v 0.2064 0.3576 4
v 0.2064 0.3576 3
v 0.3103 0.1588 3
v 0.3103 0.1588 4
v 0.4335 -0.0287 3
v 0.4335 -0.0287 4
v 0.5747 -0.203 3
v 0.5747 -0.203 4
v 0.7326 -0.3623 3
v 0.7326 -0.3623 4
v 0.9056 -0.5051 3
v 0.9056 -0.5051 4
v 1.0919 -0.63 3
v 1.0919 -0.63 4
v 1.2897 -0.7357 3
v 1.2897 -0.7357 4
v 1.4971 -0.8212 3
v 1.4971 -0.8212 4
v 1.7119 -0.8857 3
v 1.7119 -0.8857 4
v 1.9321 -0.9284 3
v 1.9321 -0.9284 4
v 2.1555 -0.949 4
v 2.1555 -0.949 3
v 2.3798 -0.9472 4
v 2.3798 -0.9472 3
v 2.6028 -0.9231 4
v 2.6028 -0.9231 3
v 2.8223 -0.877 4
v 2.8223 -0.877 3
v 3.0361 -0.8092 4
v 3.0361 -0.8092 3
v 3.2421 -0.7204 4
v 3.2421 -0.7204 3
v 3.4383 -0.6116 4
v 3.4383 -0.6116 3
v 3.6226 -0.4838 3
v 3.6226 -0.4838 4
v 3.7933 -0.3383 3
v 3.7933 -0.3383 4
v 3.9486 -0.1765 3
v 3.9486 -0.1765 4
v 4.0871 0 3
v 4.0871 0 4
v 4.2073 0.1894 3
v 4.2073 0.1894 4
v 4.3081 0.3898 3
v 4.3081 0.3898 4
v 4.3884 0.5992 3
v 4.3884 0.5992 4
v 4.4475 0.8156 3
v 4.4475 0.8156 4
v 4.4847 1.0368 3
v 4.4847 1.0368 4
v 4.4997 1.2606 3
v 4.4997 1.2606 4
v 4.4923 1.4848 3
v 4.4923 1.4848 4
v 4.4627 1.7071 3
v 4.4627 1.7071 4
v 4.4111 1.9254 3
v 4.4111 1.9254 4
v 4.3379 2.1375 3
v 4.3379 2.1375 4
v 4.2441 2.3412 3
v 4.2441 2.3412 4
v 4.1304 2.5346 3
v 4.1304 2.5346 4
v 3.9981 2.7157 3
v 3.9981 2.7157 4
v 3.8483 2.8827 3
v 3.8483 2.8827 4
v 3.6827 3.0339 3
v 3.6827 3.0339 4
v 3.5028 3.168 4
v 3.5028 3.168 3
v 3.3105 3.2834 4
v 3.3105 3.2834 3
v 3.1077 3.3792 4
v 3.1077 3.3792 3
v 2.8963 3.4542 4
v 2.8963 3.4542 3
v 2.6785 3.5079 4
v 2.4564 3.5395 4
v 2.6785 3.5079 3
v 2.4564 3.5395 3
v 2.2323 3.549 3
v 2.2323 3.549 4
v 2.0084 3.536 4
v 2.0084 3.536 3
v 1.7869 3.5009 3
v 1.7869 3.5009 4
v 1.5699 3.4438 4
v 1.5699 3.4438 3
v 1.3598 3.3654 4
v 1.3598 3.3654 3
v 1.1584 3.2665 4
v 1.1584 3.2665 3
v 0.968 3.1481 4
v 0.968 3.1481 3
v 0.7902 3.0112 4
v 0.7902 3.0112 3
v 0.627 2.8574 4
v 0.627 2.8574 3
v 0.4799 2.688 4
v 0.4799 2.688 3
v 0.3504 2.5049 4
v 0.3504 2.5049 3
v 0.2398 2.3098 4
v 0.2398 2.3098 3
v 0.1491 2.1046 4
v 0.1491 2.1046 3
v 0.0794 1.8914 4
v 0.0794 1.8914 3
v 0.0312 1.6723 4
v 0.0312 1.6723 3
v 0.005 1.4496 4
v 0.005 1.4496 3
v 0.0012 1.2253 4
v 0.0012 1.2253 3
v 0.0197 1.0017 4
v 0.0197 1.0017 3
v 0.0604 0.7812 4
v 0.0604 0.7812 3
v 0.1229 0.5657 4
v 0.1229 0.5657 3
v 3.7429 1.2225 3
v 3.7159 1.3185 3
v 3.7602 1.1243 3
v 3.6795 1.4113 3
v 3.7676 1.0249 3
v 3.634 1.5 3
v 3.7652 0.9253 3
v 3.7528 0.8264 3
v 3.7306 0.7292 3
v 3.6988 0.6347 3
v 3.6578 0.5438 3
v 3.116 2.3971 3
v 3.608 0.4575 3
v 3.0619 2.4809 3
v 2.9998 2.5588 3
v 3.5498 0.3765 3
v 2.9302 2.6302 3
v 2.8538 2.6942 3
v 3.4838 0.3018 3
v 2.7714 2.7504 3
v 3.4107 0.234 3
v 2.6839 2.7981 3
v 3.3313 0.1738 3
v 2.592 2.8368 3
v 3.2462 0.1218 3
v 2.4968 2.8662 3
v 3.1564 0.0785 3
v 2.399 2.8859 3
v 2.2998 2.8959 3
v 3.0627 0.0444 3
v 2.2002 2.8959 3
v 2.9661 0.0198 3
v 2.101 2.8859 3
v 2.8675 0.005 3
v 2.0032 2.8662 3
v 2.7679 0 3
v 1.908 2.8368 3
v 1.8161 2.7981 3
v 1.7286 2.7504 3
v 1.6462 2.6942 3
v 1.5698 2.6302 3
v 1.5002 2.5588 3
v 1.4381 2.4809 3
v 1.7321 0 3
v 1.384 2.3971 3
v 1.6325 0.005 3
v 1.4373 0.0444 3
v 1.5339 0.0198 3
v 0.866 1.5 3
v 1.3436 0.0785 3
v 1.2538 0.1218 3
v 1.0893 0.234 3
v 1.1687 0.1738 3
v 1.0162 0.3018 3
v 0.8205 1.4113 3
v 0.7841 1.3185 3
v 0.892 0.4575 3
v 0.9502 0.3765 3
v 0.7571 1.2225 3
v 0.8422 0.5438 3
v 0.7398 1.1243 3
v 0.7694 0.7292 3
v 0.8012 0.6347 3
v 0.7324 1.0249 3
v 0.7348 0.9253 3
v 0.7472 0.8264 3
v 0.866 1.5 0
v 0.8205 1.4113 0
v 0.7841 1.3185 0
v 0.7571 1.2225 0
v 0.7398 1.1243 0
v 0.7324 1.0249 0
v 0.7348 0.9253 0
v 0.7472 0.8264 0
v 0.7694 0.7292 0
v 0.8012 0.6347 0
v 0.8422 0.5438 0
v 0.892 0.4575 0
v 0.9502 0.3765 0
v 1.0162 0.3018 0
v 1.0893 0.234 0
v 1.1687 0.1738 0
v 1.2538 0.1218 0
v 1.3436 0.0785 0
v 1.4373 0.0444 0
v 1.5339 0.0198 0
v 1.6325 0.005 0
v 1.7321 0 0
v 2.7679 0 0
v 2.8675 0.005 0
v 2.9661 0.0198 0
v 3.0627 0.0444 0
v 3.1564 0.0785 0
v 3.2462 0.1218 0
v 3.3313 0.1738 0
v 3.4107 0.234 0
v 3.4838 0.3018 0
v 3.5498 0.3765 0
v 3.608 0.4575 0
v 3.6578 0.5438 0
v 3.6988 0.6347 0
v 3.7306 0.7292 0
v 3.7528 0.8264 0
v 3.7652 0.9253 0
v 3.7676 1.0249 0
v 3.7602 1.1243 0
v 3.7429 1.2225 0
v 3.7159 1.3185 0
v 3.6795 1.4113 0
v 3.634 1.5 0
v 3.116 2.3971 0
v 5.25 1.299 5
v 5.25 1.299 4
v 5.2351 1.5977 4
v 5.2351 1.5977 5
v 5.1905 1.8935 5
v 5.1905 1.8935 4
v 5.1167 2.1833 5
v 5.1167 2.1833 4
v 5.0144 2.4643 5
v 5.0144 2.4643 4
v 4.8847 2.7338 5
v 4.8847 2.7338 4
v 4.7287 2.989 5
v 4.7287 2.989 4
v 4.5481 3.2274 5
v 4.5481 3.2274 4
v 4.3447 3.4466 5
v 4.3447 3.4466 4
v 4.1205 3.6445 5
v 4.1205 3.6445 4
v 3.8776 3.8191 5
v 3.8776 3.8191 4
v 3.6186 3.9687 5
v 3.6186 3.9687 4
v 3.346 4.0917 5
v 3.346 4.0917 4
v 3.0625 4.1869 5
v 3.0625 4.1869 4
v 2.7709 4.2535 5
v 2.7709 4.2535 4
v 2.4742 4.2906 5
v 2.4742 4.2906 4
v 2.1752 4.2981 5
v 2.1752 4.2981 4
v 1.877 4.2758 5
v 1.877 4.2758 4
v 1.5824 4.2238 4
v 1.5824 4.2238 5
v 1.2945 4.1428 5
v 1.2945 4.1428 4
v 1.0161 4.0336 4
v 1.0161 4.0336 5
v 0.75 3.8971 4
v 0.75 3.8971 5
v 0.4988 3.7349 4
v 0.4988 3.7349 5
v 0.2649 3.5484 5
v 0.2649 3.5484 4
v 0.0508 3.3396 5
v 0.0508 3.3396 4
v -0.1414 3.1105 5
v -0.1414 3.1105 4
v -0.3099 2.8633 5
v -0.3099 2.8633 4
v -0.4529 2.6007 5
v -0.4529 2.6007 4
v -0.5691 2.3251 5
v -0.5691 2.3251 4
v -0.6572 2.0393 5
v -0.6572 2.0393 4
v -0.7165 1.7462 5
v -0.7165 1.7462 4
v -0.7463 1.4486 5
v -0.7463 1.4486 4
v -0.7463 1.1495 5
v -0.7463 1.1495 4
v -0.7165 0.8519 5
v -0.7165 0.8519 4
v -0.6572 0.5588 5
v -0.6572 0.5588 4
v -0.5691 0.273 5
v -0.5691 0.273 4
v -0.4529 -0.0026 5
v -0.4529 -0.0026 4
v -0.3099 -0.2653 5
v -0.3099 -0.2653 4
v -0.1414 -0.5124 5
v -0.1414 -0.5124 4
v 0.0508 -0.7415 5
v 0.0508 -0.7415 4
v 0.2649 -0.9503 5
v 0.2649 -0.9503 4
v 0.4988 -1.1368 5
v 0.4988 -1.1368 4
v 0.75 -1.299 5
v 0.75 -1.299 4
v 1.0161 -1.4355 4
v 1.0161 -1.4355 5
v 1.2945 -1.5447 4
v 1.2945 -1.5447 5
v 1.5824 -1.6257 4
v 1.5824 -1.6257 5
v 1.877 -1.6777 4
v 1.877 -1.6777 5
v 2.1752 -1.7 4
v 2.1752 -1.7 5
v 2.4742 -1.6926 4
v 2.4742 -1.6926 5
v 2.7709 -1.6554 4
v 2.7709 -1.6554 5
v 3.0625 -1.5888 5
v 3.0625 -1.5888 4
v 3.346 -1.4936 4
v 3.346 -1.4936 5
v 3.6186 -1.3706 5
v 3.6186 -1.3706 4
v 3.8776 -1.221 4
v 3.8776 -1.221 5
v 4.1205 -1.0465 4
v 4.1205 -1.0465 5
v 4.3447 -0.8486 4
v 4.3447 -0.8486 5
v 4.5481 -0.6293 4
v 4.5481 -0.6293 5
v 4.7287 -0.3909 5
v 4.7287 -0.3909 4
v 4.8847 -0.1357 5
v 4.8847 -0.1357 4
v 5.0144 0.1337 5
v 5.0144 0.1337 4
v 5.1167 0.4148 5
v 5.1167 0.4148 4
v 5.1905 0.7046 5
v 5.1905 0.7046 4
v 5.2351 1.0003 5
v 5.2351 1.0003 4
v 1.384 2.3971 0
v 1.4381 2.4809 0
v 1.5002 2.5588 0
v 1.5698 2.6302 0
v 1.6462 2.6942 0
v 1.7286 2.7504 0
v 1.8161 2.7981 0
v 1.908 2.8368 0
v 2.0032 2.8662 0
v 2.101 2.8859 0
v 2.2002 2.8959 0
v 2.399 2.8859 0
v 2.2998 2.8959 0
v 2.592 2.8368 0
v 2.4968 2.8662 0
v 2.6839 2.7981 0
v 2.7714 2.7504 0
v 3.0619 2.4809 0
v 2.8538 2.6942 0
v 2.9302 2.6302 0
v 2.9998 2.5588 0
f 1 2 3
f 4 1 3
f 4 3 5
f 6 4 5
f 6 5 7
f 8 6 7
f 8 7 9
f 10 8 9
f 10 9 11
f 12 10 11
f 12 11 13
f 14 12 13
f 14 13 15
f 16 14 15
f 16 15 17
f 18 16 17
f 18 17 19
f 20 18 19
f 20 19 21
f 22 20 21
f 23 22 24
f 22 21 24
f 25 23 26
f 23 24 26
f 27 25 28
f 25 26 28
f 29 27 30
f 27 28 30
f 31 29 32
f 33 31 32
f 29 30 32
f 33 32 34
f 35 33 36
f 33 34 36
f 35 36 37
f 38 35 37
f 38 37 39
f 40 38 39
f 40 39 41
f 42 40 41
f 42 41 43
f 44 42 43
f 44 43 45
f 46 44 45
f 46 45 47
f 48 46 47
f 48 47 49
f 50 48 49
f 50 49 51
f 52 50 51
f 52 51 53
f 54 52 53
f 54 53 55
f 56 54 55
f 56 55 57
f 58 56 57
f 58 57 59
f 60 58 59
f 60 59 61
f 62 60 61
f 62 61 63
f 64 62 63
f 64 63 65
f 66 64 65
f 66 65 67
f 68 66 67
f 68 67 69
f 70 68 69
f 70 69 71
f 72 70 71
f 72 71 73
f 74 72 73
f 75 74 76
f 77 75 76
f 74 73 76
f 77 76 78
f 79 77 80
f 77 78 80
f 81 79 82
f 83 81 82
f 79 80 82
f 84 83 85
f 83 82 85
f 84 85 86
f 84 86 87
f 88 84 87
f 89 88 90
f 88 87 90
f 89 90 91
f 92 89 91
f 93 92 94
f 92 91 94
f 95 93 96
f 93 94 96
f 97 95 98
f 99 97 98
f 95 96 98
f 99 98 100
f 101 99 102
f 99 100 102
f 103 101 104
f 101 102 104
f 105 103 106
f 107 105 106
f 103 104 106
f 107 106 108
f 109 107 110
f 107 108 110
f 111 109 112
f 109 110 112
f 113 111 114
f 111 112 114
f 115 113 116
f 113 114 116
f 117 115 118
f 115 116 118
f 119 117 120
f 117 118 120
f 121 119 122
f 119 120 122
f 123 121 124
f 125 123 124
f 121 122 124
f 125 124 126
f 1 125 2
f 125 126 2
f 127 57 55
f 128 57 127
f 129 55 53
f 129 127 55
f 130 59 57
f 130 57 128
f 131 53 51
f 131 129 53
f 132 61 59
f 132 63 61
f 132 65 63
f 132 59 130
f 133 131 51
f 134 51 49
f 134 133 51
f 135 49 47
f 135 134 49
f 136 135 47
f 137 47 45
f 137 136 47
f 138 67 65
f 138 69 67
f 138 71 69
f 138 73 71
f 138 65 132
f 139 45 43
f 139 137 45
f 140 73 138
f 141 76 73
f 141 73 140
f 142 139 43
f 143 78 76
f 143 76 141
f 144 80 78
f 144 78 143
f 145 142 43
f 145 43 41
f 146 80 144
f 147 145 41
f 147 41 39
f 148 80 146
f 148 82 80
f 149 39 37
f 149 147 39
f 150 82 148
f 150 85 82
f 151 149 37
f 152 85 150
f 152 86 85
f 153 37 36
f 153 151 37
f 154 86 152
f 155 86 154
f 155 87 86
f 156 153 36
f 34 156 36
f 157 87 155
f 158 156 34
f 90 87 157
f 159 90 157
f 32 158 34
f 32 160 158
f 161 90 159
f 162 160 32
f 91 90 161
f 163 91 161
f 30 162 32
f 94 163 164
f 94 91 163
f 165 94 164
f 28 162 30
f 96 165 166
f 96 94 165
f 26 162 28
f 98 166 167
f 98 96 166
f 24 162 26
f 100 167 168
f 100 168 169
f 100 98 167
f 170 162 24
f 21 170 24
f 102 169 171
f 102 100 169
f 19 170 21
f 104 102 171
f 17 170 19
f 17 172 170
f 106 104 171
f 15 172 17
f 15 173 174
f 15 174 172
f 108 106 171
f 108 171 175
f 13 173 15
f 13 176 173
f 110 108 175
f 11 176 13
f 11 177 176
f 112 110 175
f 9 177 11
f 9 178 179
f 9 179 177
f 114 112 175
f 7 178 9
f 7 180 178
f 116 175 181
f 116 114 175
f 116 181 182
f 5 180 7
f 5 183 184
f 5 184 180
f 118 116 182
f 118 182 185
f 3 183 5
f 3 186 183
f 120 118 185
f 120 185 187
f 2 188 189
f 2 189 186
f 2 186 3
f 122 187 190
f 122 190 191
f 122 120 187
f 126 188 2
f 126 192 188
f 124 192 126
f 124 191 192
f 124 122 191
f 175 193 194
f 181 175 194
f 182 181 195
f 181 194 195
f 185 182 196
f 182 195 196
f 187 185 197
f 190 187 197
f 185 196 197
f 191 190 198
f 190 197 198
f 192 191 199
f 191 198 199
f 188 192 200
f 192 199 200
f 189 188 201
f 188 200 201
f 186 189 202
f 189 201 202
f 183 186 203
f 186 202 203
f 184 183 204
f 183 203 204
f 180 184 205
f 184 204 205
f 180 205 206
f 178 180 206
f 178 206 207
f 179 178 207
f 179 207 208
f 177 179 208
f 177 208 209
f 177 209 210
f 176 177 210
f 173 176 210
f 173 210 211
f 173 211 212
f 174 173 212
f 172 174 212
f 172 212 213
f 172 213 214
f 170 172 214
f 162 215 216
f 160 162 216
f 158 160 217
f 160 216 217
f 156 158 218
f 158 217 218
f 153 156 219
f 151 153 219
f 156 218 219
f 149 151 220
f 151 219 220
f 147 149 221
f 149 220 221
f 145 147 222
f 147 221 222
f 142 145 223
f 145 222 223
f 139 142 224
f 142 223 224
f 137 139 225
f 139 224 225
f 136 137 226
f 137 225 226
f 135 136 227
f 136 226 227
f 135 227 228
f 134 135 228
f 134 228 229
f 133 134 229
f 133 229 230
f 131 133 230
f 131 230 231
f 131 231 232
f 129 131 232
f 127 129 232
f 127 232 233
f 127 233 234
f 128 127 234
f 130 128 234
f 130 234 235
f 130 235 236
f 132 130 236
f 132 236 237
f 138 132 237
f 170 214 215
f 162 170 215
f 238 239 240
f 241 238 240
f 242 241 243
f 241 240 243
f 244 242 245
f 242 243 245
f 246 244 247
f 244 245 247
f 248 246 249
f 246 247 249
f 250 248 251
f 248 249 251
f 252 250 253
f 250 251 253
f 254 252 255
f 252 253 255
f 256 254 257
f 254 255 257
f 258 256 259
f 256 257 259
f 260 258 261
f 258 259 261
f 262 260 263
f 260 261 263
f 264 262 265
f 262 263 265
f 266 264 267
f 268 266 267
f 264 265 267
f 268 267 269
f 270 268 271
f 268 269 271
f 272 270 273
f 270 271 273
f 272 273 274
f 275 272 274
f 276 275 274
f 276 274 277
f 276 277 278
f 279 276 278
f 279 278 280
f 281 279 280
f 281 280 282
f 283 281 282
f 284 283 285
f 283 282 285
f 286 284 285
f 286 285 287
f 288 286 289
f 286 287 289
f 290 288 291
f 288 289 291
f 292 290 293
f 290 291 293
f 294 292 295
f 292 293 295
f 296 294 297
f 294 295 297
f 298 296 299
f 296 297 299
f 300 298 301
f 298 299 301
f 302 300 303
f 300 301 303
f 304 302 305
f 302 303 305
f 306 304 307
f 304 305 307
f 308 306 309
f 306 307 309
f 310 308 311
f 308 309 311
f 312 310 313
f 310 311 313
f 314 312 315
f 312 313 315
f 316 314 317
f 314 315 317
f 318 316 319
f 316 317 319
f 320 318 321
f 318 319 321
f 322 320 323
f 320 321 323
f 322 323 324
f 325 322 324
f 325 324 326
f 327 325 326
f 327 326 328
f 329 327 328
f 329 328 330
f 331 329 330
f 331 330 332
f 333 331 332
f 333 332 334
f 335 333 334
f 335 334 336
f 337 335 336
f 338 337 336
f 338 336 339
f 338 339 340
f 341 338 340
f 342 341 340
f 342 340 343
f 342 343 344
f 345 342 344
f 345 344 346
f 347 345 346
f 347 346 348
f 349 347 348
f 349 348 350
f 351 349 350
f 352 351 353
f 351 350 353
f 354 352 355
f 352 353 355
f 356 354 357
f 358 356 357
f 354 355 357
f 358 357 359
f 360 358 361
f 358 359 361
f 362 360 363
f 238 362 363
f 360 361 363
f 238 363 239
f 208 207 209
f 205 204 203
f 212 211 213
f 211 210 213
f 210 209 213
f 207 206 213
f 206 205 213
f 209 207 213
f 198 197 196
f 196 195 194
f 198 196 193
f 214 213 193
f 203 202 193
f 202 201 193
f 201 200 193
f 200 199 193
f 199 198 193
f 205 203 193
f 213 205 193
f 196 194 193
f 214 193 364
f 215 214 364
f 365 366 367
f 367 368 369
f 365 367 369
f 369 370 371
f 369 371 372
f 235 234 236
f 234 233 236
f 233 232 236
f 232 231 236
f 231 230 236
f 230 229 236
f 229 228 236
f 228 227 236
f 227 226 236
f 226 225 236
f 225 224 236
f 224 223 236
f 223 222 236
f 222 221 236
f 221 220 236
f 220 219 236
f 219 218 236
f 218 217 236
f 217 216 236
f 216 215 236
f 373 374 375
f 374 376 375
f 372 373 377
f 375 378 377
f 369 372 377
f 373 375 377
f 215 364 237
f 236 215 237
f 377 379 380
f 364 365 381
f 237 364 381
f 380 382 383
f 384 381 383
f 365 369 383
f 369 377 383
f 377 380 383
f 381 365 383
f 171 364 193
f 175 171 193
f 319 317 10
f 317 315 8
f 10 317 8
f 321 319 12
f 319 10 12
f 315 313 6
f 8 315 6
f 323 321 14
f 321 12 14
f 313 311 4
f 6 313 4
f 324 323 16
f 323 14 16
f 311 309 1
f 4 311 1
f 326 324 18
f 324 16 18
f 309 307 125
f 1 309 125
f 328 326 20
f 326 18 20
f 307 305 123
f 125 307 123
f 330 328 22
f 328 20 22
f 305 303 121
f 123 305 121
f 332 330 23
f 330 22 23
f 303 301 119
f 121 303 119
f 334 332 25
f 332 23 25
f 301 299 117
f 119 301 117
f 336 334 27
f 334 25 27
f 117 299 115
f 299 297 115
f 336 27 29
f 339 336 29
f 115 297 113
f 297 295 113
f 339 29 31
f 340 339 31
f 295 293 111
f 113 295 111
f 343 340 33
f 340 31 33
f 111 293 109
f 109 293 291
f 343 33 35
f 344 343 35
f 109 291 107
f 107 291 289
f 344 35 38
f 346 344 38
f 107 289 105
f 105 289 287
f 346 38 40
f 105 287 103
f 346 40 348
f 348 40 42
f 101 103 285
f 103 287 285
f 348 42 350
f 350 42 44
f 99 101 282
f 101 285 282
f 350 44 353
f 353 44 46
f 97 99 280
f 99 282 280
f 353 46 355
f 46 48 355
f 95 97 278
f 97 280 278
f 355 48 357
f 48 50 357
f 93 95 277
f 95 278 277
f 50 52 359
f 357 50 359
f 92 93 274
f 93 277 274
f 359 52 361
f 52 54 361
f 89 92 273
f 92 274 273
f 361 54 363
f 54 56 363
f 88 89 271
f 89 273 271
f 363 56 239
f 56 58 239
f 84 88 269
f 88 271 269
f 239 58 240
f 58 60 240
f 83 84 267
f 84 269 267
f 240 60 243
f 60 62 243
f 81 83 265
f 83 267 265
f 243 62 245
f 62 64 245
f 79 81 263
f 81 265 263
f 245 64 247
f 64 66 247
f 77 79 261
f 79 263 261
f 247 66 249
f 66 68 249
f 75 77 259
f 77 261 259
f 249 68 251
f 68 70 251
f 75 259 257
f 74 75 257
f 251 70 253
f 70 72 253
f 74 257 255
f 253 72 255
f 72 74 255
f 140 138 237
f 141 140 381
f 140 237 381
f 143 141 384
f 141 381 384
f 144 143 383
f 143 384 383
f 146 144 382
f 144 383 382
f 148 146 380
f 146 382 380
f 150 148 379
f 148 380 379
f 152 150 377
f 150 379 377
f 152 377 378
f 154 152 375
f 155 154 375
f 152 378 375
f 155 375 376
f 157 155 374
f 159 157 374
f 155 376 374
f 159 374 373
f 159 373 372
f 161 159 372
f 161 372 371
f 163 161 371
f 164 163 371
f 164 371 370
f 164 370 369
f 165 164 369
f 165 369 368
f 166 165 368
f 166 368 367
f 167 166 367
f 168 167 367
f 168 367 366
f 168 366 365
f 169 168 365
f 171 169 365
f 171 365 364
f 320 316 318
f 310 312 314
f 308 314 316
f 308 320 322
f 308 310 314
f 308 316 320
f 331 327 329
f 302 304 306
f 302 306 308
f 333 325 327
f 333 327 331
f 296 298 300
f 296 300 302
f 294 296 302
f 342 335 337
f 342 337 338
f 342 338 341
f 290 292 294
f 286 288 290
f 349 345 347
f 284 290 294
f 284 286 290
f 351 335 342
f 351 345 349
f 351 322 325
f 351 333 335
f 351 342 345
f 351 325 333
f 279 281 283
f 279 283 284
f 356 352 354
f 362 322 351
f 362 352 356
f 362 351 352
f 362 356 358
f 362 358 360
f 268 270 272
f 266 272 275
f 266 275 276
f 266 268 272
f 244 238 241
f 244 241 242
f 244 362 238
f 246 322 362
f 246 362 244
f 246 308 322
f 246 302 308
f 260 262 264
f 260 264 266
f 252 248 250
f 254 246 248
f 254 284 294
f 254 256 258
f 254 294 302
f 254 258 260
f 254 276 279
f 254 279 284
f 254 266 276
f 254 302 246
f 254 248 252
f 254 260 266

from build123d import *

# Parameters (mm, degrees)
EXTRUDE_1_DEPTH = 3
SKETCH_2_R      = 2.25
EXTRUDE_2_DEPTH = 1
SKETCH_3_R      = 3
EXTRUDE_3_DEPTH = 1
FILLET_1_R      = 1


with BuildPart() as part:
    # 草图1 → 凸台-拉伸1 (new body)
    with BuildSketch(Plane.XY):
        Polygon((0, 0), (4.5, 0), (2.25, 3.897114317), align=None)
    extrude(amount=EXTRUDE_1_DEPTH)

    # 草图2 → 凸台-拉伸2 (add)
    with BuildSketch(Plane.XY.offset(3)):
        with Locations(Location((2.25, 1.299038106, 0), (0, 0, 204.735610317))):
            Circle(SKETCH_2_R)
    extrude(amount=EXTRUDE_2_DEPTH)

    # 草图3 → 凸台-拉伸3 (add)
    with BuildSketch(Plane.XY.offset(4)):
        with Locations((2.25, 1.299038106)):
            Circle(SKETCH_3_R)
    extrude(amount=EXTRUDE_3_DEPTH)

    # 圆角1
    # the kernel refuses this fillet: 1 mm, written as the material it takes off along each edge
    with BuildSketch(Plane(origin=(2.25, 3.897114317, -4.330127019), x_dir=(-0.4999999999999997, -0.8660254037844388, 0), z_dir=(0, 0, 1))) as fillet_1_piece_1:
        with BuildLine():
            CenterArc((FILLET_1_R * 1.73205080757, FILLET_1_R), FILLET_1_R, 150, 120)
            Line((FILLET_1_R * 0.866025403784, FILLET_1_R * 1.5), (0, 0))
            Line((0, 0), (FILLET_1_R * 1.73205080757, 0))
        make_face()
    extrude(amount=7.330127019, mode=Mode.SUBTRACT)
    with BuildSketch(Plane(origin=(4.5, 0, -4.330127019), x_dir=(-1, 0, 0), z_dir=(0, 0, 1)), Plane(origin=(0, 0, -4.330127019), x_dir=(0.49999999999999983, 0.8660254037844387, 0), z_dir=(0, 0, 1))) as fillet_1_piece_2:
        with BuildLine():
            CenterArc((FILLET_1_R * 1.73205080757, -FILLET_1_R), FILLET_1_R, 90, 120)
            Line((FILLET_1_R * 0.866025403784, -FILLET_1_R * 1.5), (0, 0))
            Line((0, 0), (FILLET_1_R * 1.73205080757, 0))
        make_face()
    extrude(amount=7.330127019, mode=Mode.SUBTRACT)


solid = part.part
